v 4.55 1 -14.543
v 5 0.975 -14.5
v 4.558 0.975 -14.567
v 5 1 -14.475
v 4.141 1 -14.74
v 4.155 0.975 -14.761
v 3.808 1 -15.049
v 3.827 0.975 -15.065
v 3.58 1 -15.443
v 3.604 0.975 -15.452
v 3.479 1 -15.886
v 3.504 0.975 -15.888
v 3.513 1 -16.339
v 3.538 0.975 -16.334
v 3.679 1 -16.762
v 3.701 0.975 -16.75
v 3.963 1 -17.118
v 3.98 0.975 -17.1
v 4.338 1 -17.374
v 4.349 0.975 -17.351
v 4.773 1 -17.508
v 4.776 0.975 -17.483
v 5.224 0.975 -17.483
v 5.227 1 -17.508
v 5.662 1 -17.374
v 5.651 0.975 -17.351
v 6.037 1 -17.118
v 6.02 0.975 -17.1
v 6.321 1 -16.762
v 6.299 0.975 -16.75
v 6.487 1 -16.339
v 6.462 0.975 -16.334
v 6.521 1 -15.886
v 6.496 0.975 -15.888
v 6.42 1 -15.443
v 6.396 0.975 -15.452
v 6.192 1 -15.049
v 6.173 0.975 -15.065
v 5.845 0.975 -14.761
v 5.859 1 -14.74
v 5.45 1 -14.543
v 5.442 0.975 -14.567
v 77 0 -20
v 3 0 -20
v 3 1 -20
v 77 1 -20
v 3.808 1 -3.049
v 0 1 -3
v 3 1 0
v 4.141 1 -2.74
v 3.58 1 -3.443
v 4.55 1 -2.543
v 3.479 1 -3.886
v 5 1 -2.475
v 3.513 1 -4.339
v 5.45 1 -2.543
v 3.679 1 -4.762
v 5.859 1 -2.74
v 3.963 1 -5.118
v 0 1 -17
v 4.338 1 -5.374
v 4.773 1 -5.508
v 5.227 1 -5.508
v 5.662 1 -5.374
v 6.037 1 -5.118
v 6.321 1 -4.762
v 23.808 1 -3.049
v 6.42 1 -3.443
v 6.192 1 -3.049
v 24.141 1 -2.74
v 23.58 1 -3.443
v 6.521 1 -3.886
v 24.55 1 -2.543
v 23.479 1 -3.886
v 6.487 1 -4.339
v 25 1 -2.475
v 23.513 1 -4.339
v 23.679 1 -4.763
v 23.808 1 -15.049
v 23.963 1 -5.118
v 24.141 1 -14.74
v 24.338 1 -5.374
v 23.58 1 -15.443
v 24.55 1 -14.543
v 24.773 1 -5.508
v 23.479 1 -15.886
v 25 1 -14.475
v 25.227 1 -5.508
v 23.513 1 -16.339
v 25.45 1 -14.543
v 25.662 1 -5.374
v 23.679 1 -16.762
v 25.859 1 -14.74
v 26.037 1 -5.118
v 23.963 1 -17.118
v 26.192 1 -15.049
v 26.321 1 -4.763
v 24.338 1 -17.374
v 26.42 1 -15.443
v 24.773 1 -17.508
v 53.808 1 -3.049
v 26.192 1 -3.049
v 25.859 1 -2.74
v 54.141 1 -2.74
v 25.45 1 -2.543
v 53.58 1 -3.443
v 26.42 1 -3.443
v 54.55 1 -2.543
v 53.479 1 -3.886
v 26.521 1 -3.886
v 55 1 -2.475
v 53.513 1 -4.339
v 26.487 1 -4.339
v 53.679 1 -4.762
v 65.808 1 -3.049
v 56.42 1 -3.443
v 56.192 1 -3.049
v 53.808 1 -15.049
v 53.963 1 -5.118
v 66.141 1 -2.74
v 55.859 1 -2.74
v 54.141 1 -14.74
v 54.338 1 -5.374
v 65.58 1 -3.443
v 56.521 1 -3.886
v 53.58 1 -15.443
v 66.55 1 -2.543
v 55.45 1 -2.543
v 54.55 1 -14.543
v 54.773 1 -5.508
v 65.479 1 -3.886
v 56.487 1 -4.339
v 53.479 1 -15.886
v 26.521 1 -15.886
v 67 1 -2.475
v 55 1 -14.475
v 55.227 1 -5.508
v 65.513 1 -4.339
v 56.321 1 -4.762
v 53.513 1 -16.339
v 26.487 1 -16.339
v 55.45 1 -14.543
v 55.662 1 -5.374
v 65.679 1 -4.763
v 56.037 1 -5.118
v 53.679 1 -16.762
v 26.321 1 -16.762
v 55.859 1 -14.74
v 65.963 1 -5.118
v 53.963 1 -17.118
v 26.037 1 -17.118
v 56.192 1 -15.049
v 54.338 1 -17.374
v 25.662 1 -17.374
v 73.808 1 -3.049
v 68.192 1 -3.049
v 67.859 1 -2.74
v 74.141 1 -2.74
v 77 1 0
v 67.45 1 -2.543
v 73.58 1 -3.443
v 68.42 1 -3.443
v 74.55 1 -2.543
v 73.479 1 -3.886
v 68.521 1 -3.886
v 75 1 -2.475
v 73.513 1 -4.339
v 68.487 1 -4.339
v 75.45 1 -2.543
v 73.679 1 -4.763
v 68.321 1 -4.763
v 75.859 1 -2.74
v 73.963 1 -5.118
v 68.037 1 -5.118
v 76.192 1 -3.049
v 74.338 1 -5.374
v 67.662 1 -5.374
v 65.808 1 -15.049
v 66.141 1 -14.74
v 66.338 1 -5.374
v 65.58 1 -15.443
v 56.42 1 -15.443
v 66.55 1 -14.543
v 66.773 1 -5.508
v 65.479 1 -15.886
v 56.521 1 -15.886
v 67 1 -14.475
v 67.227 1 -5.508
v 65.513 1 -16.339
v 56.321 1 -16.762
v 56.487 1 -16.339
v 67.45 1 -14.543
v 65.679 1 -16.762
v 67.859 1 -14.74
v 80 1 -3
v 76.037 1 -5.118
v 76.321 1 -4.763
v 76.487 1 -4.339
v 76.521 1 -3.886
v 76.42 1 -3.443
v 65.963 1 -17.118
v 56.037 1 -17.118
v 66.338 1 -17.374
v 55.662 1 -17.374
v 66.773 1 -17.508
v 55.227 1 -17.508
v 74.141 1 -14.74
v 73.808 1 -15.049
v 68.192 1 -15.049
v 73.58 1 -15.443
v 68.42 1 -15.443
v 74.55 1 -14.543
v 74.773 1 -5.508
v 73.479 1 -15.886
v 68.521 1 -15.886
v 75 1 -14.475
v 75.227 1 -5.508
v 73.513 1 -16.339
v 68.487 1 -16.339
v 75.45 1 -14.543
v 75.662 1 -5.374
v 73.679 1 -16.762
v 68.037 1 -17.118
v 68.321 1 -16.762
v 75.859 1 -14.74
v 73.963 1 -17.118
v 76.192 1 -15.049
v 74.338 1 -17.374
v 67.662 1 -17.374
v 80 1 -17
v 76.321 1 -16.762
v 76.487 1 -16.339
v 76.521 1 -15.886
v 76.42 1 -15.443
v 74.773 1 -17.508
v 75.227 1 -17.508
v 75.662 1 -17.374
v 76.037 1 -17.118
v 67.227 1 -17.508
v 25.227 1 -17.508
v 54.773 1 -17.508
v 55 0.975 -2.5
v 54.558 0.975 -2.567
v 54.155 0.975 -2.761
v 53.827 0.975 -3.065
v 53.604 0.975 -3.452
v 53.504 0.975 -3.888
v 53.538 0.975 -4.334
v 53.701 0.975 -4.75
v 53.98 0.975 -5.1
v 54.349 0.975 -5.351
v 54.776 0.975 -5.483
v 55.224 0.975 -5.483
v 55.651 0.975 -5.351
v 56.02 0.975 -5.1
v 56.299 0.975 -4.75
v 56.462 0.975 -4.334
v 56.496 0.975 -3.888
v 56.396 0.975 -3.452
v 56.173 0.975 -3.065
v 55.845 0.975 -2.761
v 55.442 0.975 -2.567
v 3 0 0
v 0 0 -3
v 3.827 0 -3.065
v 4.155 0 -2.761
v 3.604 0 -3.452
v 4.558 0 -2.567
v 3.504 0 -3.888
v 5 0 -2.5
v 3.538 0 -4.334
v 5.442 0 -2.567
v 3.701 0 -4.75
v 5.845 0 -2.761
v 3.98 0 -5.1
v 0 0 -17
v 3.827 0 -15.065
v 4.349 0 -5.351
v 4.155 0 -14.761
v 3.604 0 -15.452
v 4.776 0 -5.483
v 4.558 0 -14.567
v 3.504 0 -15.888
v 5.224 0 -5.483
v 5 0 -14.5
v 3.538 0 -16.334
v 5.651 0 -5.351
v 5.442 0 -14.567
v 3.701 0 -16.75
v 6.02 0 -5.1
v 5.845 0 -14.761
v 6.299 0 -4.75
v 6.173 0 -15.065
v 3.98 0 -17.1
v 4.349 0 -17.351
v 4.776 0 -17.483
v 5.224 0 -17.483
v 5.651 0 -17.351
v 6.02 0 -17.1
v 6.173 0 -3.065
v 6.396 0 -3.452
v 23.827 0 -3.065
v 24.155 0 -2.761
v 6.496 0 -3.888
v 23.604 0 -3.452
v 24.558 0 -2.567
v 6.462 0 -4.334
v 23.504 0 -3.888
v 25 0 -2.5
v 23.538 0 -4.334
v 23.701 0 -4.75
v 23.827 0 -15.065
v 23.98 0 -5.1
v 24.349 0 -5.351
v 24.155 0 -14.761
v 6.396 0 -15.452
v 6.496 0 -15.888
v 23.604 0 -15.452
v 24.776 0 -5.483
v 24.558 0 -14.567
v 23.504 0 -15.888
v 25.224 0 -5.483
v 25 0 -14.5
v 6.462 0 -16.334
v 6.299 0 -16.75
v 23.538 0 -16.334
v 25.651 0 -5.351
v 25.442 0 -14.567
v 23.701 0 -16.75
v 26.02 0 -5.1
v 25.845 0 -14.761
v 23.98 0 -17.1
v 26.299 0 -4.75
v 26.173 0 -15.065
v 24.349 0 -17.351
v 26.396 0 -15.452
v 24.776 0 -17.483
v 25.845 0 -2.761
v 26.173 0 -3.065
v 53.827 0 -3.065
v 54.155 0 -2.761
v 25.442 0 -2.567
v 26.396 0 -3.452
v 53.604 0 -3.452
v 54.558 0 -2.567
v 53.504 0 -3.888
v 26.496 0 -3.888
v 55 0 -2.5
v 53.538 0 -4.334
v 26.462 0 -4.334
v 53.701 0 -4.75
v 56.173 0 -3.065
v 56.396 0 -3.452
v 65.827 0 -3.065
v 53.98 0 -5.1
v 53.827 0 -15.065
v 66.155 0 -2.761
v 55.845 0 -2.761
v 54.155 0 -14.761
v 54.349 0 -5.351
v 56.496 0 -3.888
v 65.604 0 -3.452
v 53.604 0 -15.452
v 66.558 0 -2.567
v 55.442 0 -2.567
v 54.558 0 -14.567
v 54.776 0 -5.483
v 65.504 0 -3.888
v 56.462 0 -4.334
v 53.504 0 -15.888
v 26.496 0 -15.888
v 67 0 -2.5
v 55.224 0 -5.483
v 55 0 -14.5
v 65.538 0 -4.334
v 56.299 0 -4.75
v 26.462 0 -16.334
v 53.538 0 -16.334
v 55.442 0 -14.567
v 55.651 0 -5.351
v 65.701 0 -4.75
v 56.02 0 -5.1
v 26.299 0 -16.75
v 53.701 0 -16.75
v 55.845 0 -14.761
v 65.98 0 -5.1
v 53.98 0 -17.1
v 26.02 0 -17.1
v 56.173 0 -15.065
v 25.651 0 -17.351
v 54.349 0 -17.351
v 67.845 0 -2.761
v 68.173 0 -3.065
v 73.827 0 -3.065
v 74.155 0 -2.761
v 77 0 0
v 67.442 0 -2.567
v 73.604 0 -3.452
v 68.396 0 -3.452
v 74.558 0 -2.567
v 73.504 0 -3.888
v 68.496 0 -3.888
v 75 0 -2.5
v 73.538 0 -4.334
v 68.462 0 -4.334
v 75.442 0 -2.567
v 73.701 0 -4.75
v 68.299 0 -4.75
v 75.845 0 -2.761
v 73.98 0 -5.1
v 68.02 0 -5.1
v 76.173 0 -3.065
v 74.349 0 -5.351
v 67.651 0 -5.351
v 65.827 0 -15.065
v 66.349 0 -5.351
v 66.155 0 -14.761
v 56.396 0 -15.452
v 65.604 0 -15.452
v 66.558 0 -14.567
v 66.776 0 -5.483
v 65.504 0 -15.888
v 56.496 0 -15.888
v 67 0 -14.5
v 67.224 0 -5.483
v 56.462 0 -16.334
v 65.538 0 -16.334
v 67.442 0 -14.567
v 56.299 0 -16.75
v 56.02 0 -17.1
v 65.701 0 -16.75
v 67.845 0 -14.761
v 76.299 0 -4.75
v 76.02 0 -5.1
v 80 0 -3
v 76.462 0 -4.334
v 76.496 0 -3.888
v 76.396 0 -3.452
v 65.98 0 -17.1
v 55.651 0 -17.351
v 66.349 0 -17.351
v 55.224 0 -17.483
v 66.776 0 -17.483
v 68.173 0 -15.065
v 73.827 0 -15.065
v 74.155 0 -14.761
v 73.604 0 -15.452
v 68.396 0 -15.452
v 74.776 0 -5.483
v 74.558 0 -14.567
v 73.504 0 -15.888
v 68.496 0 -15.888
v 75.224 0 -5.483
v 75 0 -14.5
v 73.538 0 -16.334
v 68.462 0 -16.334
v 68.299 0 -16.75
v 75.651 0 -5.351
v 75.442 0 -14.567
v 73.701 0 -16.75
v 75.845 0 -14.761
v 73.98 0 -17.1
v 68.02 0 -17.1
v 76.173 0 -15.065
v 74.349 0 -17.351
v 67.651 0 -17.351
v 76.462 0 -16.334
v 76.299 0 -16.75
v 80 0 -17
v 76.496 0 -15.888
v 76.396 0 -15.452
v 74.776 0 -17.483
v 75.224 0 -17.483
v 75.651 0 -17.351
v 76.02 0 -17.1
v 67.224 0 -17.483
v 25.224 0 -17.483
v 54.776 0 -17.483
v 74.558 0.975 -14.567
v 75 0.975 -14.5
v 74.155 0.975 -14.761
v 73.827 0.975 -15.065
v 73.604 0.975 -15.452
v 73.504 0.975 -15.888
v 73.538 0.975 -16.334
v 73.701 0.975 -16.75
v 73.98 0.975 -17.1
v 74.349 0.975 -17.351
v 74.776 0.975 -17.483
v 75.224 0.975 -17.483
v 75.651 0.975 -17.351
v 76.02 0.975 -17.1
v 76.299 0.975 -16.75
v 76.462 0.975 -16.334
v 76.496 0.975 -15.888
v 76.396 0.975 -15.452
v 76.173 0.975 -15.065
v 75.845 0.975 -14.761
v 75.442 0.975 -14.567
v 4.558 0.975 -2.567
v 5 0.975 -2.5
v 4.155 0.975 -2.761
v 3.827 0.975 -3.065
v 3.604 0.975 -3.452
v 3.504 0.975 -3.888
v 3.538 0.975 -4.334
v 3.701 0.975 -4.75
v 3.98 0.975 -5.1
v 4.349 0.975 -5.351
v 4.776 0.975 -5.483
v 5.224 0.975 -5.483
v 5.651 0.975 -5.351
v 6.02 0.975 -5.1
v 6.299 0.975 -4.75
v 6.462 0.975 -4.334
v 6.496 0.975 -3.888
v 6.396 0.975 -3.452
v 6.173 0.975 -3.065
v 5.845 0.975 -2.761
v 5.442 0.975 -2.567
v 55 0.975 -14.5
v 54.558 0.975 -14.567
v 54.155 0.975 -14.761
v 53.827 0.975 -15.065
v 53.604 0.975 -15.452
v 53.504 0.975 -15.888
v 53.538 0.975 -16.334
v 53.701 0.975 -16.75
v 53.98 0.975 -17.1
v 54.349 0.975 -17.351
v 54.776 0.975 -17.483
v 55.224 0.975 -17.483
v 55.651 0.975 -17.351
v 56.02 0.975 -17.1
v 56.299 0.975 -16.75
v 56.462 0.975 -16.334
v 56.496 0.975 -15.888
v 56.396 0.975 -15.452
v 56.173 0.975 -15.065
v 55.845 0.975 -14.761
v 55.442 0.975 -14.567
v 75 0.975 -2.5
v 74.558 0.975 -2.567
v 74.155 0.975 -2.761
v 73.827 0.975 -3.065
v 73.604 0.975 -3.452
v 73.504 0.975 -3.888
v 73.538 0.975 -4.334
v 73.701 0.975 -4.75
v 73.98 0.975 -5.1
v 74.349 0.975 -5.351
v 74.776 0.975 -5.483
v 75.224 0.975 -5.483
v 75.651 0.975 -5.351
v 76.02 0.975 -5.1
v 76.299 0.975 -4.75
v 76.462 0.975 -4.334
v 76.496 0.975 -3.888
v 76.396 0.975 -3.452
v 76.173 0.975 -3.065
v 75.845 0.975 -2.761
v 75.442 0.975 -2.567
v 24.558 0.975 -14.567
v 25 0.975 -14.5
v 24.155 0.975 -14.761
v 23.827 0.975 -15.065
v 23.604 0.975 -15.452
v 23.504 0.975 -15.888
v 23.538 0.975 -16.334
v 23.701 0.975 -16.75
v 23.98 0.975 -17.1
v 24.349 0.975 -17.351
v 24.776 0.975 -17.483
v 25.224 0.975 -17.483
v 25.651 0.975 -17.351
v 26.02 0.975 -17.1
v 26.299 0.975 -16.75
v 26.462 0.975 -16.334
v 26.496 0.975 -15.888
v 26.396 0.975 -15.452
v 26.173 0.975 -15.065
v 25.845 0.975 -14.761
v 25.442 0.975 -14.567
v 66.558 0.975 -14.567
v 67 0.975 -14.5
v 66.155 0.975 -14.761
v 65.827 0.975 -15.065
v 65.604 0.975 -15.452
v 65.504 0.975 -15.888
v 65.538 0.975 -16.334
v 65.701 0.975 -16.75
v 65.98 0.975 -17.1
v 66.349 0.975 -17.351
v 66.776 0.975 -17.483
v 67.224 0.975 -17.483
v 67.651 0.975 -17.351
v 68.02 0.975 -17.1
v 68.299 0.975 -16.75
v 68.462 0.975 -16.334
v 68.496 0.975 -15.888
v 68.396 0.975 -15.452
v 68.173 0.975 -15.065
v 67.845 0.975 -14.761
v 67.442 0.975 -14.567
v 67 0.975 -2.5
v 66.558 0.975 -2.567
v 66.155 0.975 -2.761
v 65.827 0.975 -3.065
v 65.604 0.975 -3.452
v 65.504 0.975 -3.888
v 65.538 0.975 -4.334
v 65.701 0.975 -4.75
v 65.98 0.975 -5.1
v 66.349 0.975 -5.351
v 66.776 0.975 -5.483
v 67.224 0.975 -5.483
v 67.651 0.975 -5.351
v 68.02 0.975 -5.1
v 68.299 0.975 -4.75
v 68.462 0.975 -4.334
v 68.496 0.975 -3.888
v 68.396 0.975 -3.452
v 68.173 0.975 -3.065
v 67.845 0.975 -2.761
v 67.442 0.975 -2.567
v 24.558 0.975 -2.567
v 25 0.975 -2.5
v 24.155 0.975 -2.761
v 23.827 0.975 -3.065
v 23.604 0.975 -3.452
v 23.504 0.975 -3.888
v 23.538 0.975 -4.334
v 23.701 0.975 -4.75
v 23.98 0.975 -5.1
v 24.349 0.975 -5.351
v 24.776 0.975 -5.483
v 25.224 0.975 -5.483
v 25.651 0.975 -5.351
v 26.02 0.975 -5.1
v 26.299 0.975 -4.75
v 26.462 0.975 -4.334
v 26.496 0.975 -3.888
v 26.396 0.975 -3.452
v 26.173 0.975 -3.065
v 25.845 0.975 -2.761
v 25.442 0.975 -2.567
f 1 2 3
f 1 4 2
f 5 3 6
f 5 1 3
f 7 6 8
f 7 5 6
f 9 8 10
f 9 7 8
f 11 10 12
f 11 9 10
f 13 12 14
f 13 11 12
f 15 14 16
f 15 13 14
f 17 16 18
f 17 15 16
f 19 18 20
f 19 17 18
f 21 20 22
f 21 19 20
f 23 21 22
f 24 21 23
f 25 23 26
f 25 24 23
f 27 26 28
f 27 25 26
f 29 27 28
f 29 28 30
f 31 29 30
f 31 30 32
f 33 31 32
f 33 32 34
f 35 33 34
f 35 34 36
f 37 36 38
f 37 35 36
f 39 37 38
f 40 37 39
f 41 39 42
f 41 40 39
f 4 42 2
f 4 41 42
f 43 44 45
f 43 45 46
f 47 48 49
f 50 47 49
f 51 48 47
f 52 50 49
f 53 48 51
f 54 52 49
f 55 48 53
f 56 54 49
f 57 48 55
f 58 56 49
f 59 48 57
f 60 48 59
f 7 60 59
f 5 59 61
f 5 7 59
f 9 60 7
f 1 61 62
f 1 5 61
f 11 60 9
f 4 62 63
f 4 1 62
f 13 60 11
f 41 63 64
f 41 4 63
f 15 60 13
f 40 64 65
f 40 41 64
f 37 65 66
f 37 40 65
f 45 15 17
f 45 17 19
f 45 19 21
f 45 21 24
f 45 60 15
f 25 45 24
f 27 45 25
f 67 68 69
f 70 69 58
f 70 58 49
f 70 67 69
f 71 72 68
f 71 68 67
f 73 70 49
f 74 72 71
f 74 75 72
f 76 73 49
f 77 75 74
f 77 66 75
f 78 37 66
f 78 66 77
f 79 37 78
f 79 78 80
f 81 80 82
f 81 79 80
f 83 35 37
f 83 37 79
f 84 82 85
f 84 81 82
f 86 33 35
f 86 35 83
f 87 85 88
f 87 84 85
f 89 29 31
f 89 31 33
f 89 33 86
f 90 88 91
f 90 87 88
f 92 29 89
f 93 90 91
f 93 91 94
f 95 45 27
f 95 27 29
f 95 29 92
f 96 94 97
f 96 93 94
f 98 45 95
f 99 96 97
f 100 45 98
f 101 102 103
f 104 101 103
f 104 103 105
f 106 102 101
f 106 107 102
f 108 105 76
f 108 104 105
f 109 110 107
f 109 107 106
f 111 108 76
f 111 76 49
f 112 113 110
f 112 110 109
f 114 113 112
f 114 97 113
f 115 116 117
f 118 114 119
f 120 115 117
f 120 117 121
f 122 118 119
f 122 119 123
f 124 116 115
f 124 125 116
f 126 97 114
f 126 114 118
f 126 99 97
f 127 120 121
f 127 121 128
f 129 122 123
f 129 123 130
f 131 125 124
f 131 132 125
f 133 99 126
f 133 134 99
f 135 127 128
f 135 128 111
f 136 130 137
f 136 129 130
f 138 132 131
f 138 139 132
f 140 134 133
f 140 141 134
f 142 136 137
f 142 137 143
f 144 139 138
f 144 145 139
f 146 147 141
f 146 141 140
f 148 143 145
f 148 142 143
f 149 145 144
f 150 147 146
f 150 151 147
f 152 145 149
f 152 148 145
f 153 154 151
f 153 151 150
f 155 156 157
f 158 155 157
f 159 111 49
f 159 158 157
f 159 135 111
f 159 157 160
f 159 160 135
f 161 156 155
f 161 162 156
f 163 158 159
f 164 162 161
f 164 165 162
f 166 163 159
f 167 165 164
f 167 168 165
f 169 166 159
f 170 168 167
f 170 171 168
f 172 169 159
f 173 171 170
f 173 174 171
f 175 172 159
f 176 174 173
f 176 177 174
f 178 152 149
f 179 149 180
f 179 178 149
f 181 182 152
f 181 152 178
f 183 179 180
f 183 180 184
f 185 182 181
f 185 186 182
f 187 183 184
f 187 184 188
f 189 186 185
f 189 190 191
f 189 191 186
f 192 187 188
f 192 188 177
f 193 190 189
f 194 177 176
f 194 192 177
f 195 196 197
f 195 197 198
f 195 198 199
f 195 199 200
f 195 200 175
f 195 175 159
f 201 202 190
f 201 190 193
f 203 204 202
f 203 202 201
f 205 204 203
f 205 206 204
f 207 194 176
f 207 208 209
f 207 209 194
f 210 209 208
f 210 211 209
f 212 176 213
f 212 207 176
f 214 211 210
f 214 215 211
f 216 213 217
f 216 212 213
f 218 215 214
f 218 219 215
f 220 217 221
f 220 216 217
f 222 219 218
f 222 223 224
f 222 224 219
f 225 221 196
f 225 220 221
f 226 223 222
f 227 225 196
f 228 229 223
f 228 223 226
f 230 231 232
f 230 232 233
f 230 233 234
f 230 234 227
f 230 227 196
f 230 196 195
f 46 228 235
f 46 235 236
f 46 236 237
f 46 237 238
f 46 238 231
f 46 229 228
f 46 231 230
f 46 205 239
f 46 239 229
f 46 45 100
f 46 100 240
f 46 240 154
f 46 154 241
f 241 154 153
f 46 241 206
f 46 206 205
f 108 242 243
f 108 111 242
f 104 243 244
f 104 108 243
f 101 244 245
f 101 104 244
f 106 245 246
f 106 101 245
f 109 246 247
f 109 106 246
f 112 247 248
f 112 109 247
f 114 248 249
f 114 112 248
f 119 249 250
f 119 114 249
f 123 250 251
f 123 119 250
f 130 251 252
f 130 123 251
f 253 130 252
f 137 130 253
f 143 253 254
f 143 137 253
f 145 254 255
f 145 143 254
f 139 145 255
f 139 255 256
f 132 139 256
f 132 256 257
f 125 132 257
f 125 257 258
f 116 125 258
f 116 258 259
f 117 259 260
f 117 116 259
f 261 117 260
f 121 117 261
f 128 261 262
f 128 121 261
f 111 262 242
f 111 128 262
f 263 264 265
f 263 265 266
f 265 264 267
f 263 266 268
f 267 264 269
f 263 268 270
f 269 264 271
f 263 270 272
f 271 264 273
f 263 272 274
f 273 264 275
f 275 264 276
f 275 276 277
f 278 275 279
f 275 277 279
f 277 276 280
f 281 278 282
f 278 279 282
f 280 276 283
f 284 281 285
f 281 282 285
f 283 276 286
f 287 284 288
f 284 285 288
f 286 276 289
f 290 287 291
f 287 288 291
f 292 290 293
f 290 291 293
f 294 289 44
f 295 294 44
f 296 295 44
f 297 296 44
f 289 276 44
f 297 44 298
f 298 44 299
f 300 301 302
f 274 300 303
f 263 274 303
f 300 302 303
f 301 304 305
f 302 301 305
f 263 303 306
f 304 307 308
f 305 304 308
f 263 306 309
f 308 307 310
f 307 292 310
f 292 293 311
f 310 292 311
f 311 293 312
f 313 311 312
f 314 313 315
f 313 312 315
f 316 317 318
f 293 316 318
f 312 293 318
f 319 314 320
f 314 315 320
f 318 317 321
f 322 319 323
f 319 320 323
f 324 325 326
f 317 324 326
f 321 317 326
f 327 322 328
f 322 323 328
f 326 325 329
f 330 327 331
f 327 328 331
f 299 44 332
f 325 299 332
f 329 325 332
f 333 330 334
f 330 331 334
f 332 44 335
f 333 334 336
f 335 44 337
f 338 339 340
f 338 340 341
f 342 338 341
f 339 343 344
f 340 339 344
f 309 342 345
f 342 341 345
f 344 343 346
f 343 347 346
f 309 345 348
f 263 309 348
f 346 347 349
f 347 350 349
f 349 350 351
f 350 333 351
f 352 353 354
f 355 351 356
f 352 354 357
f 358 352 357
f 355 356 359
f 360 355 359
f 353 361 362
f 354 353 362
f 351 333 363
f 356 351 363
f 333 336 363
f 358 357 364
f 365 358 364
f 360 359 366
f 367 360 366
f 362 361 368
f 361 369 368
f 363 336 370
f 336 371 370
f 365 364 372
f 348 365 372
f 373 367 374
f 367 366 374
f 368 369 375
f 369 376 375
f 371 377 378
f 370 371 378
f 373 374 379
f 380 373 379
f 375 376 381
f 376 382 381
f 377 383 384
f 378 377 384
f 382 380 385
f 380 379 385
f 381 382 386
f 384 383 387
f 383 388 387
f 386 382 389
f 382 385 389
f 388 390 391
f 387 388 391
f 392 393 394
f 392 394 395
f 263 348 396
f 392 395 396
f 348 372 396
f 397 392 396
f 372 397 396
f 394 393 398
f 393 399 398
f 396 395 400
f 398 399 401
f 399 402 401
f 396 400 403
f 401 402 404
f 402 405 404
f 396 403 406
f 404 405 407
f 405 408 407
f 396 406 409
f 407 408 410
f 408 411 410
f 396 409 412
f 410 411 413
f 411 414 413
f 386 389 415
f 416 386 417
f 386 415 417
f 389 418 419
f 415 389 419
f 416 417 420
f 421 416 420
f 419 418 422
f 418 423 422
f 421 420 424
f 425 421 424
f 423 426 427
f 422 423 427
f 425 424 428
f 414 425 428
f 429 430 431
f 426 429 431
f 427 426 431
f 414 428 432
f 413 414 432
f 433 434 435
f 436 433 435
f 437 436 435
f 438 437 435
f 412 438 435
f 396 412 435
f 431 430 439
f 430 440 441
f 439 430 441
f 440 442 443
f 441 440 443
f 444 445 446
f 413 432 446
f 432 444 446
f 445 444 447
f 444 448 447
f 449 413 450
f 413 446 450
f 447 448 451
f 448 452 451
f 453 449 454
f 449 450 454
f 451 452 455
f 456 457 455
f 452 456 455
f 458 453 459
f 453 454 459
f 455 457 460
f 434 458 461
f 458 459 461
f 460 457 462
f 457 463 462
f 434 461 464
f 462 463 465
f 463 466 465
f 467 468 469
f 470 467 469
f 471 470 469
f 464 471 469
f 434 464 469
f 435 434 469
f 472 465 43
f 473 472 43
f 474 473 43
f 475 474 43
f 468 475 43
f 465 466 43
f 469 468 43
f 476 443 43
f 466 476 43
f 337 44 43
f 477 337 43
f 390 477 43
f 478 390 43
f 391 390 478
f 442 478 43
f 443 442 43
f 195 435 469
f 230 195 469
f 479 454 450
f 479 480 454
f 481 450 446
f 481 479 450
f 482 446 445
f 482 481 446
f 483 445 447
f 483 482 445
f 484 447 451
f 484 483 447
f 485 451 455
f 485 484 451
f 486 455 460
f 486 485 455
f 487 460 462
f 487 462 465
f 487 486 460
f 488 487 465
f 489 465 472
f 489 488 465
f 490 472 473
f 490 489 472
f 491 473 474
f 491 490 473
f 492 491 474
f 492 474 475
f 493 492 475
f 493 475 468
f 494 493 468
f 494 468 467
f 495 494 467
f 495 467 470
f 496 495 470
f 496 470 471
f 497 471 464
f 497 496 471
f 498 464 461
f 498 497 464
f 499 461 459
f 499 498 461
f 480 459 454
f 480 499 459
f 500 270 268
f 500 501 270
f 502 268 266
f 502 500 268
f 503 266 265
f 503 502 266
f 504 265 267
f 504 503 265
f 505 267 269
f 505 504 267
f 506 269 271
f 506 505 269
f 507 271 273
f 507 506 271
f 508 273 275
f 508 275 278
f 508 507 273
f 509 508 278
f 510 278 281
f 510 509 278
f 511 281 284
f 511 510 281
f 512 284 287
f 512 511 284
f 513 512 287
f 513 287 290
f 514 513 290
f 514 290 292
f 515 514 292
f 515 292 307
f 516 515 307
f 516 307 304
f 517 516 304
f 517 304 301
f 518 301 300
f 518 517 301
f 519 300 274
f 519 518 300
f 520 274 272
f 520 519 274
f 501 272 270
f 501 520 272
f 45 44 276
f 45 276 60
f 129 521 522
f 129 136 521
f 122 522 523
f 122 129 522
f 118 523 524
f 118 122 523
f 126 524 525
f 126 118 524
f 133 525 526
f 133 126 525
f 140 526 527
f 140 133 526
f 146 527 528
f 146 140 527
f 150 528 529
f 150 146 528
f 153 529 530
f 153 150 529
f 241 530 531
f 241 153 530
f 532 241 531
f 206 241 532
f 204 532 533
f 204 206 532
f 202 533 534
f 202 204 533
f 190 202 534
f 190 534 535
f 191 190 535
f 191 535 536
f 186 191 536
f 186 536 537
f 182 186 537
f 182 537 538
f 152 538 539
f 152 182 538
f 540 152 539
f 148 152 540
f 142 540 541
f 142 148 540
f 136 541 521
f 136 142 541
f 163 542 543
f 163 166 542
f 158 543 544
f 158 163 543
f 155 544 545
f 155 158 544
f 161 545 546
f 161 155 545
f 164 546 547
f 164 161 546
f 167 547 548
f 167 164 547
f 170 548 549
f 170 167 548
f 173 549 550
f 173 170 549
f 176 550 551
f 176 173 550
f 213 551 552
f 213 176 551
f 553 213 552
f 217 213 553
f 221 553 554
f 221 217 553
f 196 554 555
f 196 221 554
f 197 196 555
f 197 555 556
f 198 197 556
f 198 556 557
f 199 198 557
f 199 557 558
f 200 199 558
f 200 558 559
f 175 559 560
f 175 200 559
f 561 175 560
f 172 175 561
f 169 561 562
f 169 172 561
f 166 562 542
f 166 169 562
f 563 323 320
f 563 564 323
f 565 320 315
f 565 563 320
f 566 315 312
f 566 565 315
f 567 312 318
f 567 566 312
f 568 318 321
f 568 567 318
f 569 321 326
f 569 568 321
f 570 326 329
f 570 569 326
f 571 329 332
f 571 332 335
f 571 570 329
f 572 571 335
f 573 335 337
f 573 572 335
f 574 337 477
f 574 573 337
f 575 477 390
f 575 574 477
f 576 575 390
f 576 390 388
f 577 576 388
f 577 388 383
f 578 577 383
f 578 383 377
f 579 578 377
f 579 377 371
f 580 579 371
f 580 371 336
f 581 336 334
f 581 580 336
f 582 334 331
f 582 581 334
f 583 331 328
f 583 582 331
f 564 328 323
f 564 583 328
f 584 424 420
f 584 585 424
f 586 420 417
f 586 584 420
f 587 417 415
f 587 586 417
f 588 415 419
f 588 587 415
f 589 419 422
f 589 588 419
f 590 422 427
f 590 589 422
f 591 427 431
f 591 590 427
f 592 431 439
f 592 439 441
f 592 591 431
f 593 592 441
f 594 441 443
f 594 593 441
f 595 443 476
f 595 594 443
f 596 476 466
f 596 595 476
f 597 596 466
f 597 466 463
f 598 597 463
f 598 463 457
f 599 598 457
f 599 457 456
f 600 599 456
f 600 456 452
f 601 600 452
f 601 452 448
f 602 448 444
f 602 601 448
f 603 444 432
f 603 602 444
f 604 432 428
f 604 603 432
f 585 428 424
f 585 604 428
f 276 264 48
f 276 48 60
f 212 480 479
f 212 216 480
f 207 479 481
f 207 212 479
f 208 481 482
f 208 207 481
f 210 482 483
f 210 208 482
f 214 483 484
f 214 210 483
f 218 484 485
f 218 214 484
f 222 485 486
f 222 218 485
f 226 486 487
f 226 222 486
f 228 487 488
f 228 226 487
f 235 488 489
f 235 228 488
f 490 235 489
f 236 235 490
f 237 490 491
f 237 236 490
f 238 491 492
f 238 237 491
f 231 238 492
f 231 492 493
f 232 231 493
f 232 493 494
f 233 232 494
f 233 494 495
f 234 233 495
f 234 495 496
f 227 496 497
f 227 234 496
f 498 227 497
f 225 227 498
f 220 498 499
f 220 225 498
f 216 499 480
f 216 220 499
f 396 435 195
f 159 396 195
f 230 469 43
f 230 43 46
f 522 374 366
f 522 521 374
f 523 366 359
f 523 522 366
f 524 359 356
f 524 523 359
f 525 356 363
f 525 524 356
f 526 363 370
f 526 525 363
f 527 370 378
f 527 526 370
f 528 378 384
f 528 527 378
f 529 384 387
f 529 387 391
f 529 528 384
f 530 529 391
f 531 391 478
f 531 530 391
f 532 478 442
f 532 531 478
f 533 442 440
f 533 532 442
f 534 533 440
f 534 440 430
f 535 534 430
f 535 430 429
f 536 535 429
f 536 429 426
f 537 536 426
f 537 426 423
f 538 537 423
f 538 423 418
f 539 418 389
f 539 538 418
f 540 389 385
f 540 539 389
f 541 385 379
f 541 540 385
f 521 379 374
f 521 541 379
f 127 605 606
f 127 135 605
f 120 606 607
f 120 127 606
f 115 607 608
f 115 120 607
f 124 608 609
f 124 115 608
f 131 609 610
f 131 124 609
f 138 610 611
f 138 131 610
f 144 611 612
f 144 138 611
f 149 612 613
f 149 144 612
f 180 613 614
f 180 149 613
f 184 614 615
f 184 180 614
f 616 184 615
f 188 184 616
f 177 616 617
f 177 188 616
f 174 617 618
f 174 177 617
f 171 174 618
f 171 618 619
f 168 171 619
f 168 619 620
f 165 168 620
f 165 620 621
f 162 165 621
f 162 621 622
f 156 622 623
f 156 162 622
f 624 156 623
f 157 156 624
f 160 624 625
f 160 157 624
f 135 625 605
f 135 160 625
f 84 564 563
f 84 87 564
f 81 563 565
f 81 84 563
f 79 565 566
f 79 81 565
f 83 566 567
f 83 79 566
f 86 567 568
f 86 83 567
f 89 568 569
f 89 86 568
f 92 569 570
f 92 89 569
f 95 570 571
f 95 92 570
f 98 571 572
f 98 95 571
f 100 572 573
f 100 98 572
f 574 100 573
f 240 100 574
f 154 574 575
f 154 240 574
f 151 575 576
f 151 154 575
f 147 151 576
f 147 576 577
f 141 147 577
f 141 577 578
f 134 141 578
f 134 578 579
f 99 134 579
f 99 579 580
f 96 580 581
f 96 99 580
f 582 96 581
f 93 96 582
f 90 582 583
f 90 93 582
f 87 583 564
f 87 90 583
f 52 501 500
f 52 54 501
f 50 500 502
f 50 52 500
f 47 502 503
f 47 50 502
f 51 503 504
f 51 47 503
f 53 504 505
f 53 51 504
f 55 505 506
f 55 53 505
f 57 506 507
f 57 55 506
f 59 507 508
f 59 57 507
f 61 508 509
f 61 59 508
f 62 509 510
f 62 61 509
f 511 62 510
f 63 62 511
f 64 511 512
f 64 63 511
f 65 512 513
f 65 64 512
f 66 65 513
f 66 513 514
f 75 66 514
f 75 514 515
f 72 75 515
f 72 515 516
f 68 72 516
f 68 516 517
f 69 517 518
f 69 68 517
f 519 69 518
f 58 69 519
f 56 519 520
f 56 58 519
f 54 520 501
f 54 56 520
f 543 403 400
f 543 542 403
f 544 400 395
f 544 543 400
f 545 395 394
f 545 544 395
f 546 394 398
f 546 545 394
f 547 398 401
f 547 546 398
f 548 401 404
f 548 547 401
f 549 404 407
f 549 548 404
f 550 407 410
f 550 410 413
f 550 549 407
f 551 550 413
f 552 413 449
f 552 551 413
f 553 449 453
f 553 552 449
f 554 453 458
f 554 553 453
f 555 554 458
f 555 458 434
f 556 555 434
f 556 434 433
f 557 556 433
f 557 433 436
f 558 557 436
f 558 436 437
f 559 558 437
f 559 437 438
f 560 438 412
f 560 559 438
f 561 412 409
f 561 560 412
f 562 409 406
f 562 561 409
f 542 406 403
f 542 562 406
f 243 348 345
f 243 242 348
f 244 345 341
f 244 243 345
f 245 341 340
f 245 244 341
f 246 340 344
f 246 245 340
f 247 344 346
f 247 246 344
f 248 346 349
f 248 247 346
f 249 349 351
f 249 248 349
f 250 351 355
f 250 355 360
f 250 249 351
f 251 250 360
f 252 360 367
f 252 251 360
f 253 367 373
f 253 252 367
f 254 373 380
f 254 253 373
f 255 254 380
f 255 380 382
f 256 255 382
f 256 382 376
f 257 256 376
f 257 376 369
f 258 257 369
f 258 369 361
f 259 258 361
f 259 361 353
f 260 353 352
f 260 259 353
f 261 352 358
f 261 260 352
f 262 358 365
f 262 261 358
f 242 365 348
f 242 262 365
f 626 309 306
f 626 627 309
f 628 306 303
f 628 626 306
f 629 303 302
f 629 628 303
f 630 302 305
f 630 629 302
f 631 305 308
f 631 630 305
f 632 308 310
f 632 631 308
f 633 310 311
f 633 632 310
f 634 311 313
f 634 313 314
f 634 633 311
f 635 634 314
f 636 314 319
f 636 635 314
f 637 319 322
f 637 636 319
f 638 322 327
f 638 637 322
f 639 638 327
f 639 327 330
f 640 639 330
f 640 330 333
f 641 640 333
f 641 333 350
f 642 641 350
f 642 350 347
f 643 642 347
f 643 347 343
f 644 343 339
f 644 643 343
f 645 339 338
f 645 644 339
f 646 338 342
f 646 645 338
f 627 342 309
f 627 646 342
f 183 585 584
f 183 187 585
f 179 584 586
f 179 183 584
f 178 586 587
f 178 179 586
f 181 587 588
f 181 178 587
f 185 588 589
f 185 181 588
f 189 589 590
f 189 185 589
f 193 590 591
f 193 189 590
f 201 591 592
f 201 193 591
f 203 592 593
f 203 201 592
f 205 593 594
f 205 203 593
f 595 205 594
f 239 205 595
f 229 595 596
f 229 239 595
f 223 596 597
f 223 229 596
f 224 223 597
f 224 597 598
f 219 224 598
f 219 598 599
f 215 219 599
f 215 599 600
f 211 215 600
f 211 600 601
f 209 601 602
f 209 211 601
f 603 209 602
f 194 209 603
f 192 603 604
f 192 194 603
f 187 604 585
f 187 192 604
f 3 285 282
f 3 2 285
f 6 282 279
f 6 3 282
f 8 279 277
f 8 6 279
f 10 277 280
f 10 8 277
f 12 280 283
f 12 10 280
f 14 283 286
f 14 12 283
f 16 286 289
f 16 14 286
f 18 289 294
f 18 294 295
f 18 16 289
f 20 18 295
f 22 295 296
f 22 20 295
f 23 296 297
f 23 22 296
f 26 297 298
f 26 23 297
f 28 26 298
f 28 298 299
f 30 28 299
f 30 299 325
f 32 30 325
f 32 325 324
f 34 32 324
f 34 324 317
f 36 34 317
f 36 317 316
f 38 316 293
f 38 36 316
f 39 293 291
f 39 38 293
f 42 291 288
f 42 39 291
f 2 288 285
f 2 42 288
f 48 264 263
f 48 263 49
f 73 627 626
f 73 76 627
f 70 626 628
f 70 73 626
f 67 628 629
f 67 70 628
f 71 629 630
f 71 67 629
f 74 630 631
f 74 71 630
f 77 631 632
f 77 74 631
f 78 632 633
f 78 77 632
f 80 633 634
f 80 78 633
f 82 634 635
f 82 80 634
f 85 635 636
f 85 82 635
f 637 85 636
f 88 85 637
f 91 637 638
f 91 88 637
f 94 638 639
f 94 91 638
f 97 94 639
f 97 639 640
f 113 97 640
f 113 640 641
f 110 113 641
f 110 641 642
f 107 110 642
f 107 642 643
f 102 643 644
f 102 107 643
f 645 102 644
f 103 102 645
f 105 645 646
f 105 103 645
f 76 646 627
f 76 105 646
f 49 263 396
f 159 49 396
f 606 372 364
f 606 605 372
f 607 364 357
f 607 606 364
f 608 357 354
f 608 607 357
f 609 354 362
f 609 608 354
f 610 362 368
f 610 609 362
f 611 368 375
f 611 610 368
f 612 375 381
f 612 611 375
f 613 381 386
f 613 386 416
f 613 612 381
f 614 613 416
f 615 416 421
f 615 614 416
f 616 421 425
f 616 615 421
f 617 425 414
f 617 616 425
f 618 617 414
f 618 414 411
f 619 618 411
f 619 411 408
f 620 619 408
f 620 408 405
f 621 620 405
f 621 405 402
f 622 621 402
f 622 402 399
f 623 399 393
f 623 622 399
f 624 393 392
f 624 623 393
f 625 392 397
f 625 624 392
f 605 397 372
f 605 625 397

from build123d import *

# Parameters (mm, degrees)
SKETCH_1_W            = 80
SKETCH_1_H            = 20
EXTRUDE_1_DEPTH       = 1
F_3_0MM_1_AT_2_COUNT  = 2
F_3_0MM_1_AT_2_PITCH  = 12
F_3_0MM_1_AT_3_COUNT  = 2
F_3_0MM_1_AT_3_PITCH  = 20
F_3_0MM_1_AT_4_COUNT  = 2
F_3_0MM_1_AT_4_PITCH  = 50
F_3_0MM_1_AT_5_COUNT  = 2
F_3_0MM_1_AT_5_PITCH  = 23.323807579
F_3_0MM_1_AT_6_COUNT  = 2
F_3_0MM_1_AT_6_PITCH  = 51.419840529
F_3_0MM_1_AT_7_COUNT  = 2
F_3_0MM_1_AT_7_PITCH  = 71.021123618
F_3_0MM_1_AT_8_COUNT  = 2
F_3_0MM_1_AT_8_PITCH  = 70
F_3_0MM_1_AT_9_COUNT  = 2
F_3_0MM_1_AT_9_PITCH  = 62
F_3_0MM_1_AT_10_COUNT = 2
F_3_0MM_1_AT_10_PITCH = 63.150613615
CHAMFER_1_SIZE        = 3


with BuildPart() as part:
    # 草图1 → 凸台-拉伸1 (new body)
    with BuildSketch(Plane(origin=(0, 0, 0), x_dir=(1, 0, 0), z_dir=(0, 1, 0))):
        with Locations((40, 10)):
            Rectangle(SKETCH_1_W, SKETCH_1_H)
    extrude(amount=EXTRUDE_1_DEPTH)

    # 草图3 → Ø3.0mm 暗销孔1 (revolve, cut)
    with BuildSketch(Plane(origin=(5, 1, -16), x_dir=(0, 0, 1), z_dir=(1, 0, 0))):
        Polygon((0, 0), (0, 1), (1.5, 1), (1.5, 0.025), (1.525, 0), align=None)
    f_3_0mm_1 = revolve(axis=Axis((5, 7.35, -16), (0, -1, 0)), mode=Mode.SUBTRACT)

    # Ø3.0mm 暗销孔1 at 2: Ø3.0mm 暗销孔1 ×2
    with Locations(*[(0, 0, i * F_3_0MM_1_AT_2_PITCH) for i in range(1, F_3_0MM_1_AT_2_COUNT)]):
        add(f_3_0mm_1, mode=Mode.SUBTRACT)

    # Ø3.0mm 暗销孔1 at 3: Ø3.0mm 暗销孔1 ×2
    with Locations(*[(i * F_3_0MM_1_AT_3_PITCH, 0, 0) for i in range(1, F_3_0MM_1_AT_3_COUNT)]):
        add(f_3_0mm_1, mode=Mode.SUBTRACT)

    # Ø3.0mm 暗销孔1 at 4: Ø3.0mm 暗销孔1 ×2
    with Locations(*[(i * F_3_0MM_1_AT_4_PITCH, 0, 0) for i in range(1, F_3_0MM_1_AT_4_COUNT)]):
        add(f_3_0mm_1, mode=Mode.SUBTRACT)

    # Ø3.0mm 暗销孔1 at 5: Ø3.0mm 暗销孔1 ×2
    with Locations(*[Vector(0.8574929257125442, 0, 0.5144957554275265) * (i * F_3_0MM_1_AT_5_PITCH) for i in range(1, F_3_0MM_1_AT_5_COUNT)]):
        add(f_3_0mm_1, mode=Mode.SUBTRACT)

    # Ø3.0mm 暗销孔1 at 6: Ø3.0mm 暗销孔1 ×2
    with Locations(*[Vector(0.9723873019805175, 0, 0.23337295247532422) * (i * F_3_0MM_1_AT_6_PITCH) for i in range(1, F_3_0MM_1_AT_6_COUNT)]):
        add(f_3_0mm_1, mode=Mode.SUBTRACT)

    # Ø3.0mm 暗销孔1 at 7: Ø3.0mm 暗销孔1 ×2
    with Locations(*[Vector(0.9856222548132667, 0, 0.1689638151108457) * (i * F_3_0MM_1_AT_7_PITCH) for i in range(1, F_3_0MM_1_AT_7_COUNT)]):
        add(f_3_0mm_1, mode=Mode.SUBTRACT)

    # Ø3.0mm 暗销孔1 at 8: Ø3.0mm 暗销孔1 ×2
    with Locations(*[(i * F_3_0MM_1_AT_8_PITCH, 0, 0) for i in range(1, F_3_0MM_1_AT_8_COUNT)]):
        add(f_3_0mm_1, mode=Mode.SUBTRACT)

    # Ø3.0mm 暗销孔1 at 9: Ø3.0mm 暗销孔1 ×2
    with Locations(*[(i * F_3_0MM_1_AT_9_PITCH, 0, 0) for i in range(1, F_3_0MM_1_AT_9_COUNT)]):
        add(f_3_0mm_1, mode=Mode.SUBTRACT)

    # Ø3.0mm 暗销孔1 at 10: Ø3.0mm 暗销孔1 ×2
    with Locations(*[Vector(0.9817798505902814, 0, 0.1900219065658609) * (i * F_3_0MM_1_AT_10_PITCH) for i in range(1, F_3_0MM_1_AT_10_COUNT)]):
        add(f_3_0mm_1, mode=Mode.SUBTRACT)

    # 倒角1
    chamfer_1_edges = [part.edges().sort_by_distance(p)[0] for p in [
        (0, 0.5, 0),
        (80, 0.5, 0),
        (80, 0.5, -20),
        (0, 0.5, -20),
    ]]
    chamfer(chamfer_1_edges, length=CHAMFER_1_SIZE)


solid = part.part
